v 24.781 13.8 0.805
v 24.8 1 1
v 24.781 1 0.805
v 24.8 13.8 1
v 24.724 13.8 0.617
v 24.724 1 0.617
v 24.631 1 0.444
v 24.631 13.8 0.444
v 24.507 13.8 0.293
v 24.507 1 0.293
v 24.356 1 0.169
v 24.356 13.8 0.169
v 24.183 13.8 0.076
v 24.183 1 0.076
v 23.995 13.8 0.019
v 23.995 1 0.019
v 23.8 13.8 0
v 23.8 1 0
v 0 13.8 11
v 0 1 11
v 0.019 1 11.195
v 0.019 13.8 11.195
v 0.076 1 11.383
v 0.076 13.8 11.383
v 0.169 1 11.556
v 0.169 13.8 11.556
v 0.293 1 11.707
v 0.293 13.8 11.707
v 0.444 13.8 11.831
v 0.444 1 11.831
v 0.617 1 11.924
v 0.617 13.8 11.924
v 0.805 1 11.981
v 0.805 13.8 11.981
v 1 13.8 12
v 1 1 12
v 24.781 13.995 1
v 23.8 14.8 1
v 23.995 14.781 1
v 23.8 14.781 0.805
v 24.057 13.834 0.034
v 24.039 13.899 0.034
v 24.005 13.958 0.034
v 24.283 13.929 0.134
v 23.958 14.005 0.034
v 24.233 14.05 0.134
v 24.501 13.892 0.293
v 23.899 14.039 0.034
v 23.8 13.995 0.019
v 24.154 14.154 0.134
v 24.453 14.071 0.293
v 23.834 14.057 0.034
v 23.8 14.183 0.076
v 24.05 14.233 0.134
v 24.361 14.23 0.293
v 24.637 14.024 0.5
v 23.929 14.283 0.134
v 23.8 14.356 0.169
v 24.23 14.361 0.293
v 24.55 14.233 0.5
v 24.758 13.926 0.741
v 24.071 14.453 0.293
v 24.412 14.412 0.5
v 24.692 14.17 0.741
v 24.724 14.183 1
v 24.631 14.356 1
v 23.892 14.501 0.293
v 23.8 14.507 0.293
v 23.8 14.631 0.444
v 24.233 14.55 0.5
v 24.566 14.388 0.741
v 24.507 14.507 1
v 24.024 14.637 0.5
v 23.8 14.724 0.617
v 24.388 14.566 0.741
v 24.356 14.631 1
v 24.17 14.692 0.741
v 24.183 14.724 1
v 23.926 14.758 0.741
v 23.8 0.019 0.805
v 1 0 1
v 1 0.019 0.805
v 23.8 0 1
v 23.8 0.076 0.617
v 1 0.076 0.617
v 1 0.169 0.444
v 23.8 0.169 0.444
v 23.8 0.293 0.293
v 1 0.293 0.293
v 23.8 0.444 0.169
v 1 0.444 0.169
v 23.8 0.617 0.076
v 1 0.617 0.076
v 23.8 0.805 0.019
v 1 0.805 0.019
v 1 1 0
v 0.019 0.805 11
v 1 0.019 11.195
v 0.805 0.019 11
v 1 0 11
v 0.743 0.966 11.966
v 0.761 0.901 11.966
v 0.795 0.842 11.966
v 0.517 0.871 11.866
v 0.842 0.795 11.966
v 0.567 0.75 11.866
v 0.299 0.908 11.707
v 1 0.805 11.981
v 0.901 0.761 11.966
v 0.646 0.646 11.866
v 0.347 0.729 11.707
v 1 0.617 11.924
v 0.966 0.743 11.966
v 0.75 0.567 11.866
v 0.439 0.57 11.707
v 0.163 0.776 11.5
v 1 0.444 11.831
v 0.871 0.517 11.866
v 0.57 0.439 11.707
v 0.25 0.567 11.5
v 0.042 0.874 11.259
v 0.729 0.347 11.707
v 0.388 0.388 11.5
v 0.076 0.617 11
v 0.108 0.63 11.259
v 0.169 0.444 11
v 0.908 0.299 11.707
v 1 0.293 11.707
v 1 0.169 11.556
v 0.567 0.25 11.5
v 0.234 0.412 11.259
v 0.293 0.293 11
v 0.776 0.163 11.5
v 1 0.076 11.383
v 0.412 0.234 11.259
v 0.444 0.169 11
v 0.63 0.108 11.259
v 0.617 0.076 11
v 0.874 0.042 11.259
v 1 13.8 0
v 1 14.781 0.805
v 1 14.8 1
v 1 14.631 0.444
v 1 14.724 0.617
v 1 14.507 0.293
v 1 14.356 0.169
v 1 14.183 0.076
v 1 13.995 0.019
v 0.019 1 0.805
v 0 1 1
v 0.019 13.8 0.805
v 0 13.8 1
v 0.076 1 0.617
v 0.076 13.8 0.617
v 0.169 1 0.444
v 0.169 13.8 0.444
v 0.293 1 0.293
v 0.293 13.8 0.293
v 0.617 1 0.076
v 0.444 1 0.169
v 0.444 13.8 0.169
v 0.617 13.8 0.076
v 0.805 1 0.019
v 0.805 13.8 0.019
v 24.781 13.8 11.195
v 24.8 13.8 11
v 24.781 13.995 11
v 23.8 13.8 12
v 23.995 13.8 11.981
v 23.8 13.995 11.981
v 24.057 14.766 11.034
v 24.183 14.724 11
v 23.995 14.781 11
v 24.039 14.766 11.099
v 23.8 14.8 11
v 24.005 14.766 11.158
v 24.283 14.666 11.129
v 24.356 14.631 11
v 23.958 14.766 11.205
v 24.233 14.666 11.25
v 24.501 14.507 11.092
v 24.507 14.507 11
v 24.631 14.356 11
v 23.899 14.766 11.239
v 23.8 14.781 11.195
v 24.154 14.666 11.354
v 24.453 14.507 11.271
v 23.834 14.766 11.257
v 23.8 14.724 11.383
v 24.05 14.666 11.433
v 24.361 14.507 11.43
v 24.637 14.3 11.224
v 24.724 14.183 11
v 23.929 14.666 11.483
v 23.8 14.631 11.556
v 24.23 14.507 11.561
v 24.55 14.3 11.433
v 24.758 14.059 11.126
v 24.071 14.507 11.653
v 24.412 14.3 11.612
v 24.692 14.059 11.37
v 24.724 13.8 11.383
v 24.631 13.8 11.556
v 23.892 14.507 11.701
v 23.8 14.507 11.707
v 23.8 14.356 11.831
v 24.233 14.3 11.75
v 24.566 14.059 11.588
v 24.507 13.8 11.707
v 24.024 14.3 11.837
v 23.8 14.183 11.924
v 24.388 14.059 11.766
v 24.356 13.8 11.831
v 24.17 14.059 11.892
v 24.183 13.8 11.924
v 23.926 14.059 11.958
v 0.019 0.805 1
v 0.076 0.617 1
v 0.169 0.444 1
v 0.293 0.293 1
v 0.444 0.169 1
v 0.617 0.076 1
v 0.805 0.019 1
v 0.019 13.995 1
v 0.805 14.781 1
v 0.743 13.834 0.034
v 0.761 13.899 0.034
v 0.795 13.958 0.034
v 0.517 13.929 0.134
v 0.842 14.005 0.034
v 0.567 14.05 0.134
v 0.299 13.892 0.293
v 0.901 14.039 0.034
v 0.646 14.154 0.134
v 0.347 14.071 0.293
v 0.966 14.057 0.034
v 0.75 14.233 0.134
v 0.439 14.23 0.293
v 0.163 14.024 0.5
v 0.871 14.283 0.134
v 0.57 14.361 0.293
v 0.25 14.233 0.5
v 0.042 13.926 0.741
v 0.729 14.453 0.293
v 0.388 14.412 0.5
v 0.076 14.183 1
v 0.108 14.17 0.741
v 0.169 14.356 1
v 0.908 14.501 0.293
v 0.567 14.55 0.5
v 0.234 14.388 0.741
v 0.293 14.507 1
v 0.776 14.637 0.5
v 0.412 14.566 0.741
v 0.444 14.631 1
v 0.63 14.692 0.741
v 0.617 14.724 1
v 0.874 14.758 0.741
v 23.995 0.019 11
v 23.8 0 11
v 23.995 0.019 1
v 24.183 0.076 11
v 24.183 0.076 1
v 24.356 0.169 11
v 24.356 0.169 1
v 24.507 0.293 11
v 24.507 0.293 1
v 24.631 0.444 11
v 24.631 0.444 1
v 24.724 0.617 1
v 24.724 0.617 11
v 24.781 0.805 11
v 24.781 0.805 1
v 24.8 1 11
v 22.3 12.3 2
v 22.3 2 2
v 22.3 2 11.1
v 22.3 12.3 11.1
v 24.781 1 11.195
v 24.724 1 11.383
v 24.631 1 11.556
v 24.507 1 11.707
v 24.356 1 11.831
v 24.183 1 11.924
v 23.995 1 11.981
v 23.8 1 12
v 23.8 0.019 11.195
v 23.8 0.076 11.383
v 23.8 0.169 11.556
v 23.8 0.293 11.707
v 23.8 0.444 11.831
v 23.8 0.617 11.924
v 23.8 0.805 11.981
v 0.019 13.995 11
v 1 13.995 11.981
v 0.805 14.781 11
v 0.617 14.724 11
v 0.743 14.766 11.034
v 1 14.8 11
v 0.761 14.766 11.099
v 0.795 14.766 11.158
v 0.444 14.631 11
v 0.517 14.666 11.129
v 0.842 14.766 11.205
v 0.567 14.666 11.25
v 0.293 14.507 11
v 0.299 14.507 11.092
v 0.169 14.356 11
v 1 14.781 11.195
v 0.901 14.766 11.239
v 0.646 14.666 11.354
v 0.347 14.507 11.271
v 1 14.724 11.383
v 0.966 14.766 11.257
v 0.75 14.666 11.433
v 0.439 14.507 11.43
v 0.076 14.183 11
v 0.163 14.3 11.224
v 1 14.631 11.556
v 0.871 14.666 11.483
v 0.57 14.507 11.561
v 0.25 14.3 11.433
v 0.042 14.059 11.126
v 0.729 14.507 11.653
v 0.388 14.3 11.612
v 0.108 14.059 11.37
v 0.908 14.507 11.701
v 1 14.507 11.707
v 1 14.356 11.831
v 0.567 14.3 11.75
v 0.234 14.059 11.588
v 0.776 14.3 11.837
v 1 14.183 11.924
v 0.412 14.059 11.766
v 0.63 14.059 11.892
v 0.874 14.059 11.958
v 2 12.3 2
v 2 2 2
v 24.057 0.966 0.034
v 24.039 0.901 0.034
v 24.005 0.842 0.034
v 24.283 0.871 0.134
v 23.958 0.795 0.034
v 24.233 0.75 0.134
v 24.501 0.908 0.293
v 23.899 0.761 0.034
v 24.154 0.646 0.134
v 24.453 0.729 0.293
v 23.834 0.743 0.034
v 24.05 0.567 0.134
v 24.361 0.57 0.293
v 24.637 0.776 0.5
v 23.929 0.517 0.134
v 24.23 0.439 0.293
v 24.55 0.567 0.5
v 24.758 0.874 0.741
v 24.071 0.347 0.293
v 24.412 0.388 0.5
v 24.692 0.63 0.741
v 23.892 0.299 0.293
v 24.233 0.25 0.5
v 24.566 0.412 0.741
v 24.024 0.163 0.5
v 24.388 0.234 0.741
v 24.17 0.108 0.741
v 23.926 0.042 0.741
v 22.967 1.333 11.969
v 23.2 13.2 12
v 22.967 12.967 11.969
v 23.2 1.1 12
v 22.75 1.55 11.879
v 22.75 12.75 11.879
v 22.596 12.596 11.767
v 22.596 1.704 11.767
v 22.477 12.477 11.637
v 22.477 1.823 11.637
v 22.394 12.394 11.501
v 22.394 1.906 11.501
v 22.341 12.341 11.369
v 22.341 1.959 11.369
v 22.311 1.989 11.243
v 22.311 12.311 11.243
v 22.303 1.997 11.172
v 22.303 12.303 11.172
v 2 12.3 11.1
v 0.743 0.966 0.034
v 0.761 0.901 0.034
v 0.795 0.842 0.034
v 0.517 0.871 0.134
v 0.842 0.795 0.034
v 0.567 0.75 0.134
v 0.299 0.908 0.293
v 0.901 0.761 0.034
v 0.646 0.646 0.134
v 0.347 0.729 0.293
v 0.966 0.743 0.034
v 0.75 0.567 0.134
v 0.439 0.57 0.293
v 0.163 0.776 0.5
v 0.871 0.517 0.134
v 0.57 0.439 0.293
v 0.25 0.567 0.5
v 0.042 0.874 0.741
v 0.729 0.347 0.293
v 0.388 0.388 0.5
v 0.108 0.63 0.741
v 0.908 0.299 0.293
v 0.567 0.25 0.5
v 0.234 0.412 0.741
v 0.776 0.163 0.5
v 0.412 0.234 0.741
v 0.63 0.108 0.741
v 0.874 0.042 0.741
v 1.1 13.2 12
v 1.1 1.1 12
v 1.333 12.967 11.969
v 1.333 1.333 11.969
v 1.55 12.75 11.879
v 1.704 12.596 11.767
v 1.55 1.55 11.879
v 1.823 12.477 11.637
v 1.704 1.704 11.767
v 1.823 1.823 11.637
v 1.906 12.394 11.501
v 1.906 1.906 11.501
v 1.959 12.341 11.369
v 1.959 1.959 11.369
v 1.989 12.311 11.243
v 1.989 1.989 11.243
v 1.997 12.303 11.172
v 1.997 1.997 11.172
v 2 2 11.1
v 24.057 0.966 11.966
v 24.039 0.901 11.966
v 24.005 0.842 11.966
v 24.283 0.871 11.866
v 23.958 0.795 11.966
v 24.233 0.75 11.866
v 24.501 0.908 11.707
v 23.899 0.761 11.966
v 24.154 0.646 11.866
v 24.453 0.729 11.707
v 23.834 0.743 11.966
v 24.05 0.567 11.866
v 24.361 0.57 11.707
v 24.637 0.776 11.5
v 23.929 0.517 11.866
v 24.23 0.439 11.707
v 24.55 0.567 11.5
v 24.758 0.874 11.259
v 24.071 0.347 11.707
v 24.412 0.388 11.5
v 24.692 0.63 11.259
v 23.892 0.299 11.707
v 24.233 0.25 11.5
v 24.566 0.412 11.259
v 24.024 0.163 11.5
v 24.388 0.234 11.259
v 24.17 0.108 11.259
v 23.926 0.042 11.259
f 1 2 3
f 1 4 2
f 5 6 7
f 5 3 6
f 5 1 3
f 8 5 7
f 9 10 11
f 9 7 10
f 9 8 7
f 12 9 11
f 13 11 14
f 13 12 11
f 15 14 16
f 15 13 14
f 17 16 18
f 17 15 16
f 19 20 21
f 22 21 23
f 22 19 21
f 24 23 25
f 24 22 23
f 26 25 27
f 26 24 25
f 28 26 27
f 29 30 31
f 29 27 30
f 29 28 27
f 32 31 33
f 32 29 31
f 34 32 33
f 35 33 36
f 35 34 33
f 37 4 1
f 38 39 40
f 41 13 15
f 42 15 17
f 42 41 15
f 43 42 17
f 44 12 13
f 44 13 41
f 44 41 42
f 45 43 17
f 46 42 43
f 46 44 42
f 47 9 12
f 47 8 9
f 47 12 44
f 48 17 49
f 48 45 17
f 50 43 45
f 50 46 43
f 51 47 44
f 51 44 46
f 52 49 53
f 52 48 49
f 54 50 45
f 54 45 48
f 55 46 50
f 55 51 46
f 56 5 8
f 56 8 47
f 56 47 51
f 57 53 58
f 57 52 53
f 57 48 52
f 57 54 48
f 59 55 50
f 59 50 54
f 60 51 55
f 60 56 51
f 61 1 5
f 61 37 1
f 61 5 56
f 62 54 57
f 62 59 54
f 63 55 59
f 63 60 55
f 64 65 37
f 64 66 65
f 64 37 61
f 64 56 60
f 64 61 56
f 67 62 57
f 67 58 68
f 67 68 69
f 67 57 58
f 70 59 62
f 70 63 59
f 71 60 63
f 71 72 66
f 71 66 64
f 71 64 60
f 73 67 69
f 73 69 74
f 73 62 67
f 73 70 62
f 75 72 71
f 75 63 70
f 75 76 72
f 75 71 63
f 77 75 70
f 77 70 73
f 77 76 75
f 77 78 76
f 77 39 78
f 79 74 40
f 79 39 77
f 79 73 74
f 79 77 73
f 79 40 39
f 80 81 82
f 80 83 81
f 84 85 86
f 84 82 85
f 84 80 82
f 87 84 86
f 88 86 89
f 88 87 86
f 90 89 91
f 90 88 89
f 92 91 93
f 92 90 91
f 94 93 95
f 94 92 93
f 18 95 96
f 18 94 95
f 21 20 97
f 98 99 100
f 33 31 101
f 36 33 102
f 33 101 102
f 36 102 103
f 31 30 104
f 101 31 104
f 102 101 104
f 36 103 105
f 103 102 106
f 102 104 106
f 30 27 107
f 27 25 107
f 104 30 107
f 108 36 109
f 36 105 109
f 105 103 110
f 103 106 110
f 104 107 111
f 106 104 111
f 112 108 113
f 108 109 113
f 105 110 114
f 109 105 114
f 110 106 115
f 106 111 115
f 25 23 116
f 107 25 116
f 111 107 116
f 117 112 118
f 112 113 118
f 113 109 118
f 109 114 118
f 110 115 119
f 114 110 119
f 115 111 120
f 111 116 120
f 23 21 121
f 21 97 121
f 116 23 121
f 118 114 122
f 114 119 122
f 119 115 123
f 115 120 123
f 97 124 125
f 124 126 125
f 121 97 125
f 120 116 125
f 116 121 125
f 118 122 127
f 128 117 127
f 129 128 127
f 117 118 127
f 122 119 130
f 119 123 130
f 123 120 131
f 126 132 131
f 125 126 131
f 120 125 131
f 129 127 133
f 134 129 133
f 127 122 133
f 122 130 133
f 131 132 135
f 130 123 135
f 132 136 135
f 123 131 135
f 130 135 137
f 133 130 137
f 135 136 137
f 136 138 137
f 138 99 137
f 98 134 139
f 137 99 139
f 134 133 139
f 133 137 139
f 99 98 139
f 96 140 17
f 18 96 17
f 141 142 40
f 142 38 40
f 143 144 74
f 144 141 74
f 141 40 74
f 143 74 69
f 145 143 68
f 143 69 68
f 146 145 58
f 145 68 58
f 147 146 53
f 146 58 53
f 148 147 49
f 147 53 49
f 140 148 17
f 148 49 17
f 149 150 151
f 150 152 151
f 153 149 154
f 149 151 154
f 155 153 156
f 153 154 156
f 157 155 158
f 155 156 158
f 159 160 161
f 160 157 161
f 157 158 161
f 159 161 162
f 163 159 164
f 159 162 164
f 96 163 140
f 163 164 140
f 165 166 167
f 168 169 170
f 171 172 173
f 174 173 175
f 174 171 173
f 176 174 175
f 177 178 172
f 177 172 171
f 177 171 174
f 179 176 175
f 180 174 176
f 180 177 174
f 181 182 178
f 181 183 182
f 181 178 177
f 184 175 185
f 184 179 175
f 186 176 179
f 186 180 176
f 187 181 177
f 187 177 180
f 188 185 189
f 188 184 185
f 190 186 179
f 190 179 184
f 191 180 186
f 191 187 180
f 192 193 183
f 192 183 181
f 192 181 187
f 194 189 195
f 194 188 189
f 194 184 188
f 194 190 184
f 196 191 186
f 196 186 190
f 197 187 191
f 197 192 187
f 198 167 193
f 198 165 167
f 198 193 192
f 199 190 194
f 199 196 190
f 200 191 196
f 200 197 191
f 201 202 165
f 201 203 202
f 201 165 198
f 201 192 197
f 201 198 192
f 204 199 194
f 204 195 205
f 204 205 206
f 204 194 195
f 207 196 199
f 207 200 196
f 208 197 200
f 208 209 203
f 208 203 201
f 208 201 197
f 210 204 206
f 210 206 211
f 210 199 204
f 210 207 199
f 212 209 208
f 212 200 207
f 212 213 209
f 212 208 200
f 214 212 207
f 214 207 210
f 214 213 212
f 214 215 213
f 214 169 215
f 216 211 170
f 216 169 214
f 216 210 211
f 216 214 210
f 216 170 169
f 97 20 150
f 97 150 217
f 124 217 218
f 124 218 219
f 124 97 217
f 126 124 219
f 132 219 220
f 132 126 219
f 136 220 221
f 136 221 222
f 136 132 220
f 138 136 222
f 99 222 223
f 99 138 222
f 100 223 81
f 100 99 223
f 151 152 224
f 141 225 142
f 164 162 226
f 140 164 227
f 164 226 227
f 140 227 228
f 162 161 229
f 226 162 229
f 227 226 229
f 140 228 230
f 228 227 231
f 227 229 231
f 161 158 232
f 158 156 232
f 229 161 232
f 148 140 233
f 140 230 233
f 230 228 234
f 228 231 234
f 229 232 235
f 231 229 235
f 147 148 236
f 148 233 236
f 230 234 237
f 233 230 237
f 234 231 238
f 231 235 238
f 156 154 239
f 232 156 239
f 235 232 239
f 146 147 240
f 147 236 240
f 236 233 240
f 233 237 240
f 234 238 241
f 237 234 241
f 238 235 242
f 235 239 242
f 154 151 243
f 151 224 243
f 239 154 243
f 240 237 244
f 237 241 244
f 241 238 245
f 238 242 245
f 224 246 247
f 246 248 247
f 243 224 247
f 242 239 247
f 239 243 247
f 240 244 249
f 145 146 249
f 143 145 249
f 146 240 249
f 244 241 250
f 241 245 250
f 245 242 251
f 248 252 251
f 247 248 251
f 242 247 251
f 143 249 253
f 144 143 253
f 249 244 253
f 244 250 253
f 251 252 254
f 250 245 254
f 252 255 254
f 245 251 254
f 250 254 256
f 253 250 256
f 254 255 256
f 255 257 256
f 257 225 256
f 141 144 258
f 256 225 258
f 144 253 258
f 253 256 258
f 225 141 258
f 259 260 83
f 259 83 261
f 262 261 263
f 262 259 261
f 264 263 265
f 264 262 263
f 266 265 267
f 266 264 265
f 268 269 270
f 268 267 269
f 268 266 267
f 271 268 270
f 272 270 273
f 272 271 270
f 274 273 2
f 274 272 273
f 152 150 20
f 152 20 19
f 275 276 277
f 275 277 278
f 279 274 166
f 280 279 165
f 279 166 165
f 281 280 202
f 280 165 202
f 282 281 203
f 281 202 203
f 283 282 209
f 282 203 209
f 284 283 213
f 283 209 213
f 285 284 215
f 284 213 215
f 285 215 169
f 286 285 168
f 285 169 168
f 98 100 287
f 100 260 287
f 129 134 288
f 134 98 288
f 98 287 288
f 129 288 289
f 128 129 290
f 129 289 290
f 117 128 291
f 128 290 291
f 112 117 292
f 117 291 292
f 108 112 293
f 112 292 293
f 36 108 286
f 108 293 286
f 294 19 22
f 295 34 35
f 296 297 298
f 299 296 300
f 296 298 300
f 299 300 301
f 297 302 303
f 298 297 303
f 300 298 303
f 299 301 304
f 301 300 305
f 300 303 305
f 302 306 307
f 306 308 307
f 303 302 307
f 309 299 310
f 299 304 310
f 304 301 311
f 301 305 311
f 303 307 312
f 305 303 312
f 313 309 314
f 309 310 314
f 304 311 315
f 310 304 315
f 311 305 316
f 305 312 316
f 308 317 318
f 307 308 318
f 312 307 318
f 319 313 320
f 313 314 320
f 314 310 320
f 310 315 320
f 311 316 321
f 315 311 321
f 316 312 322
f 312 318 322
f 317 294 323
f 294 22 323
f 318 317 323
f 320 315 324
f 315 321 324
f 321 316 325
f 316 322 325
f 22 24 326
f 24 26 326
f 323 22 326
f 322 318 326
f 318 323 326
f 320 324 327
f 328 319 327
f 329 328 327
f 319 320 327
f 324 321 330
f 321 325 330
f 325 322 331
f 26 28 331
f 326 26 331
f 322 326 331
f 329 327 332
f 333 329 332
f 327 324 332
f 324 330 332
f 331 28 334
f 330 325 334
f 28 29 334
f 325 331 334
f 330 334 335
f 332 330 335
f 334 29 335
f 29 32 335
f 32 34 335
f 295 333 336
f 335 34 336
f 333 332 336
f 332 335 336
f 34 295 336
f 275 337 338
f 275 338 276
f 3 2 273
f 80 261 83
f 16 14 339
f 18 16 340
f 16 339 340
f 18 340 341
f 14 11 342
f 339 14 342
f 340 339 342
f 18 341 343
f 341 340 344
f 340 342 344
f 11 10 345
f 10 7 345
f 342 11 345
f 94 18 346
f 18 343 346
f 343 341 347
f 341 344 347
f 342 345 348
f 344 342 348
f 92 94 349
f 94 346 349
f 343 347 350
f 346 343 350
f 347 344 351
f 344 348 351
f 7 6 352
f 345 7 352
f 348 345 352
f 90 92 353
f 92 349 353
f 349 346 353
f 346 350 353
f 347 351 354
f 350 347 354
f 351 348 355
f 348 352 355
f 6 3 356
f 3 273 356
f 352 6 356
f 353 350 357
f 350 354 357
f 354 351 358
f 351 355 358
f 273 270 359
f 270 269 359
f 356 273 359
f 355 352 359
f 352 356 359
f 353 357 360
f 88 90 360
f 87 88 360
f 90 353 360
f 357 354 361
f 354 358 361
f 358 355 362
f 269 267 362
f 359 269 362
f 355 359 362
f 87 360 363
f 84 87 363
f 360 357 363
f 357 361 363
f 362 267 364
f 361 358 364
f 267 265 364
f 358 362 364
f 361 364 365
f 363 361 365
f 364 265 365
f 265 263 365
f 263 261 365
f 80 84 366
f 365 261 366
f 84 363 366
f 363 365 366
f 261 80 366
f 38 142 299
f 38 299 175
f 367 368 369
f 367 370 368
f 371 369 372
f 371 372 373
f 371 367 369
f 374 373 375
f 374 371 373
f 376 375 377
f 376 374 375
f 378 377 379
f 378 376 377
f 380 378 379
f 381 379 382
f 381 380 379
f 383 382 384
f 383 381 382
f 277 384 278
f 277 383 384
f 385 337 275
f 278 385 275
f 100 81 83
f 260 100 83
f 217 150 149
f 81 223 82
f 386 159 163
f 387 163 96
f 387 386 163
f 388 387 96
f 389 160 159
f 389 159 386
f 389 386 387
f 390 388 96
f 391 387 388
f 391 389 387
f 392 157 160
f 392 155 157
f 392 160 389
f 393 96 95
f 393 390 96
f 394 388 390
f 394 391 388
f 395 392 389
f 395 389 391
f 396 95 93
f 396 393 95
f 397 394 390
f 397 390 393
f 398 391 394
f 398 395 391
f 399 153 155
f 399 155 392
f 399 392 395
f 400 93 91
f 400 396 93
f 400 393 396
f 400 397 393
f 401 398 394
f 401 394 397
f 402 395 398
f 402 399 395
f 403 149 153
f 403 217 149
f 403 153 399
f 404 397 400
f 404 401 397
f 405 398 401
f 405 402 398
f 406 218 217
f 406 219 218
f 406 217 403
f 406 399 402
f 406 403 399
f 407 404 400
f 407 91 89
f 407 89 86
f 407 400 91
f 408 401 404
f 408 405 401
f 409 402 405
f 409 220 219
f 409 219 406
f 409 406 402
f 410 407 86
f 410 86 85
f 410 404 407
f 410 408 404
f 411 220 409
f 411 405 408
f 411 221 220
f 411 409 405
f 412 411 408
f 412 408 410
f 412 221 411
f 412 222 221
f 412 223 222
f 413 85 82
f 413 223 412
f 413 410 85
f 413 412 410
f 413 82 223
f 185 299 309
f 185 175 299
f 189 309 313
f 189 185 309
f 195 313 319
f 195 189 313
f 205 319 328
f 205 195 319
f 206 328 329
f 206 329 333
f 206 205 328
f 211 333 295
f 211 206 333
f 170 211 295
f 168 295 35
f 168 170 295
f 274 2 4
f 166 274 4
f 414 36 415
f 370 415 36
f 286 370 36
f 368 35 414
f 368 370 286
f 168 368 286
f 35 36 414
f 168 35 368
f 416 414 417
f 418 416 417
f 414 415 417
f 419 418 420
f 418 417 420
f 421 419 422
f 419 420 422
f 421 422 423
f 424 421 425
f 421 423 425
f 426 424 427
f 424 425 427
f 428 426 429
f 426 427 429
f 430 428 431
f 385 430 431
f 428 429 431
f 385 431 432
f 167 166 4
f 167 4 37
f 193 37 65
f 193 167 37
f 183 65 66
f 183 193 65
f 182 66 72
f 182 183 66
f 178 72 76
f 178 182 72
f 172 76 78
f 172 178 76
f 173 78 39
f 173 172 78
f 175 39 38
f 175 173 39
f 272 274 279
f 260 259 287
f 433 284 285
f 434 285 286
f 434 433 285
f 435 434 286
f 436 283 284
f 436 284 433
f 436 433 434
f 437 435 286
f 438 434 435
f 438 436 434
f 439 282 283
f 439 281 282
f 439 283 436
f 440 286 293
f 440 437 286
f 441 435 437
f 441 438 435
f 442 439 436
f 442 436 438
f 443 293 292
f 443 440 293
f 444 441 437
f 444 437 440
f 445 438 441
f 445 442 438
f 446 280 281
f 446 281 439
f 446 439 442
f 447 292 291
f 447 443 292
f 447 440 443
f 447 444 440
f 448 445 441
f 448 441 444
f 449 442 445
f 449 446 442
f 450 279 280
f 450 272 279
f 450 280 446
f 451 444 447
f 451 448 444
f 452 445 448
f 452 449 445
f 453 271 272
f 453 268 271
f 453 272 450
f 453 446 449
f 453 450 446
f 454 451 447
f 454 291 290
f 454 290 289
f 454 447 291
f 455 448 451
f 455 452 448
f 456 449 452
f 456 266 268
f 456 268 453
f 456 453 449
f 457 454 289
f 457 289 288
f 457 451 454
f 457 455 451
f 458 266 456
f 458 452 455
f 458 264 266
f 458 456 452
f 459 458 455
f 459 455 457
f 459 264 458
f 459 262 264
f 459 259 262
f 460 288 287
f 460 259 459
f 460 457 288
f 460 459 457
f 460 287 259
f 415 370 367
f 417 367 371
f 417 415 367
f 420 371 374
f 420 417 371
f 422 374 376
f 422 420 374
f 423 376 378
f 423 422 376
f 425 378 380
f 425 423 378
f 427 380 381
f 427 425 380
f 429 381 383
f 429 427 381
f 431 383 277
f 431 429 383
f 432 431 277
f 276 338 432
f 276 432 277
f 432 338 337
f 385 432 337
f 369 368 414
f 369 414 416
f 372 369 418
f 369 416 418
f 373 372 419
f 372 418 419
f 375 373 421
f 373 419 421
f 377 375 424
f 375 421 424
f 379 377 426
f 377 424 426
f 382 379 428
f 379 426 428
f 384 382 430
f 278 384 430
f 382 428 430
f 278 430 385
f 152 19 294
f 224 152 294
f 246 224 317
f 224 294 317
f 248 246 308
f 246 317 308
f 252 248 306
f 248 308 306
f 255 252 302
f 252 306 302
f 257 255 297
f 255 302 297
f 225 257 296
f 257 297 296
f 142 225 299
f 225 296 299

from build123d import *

# Parameters (mm, degrees)
BOX038_W     = 20.3
BOX038_H     = 10.3
BOX038_DEPTH = 300
BOX039_W     = 24.8
BOX039_H     = 14.8
BOX039_DEPTH = 12
FILLET019_R  = 1
FILLET020_R  = 0.9


with BuildPart() as cube_20x10_clone001:
    # Box038 → Box038 (new body)
    with BuildSketch(Plane.XY):
        with Locations((10.15, 5.15)):
            Rectangle(BOX038_W, BOX038_H)
    extrude(amount=BOX038_DEPTH)


with BuildPart() as cube_20x10_clone001_1:
    # Body012 placement: moved
    add(cube_20x10_clone001.part.moved(Location((2, 2, 2))))


with BuildPart() as profile_cap_outer_fillet:
    # Box039 → Box039 (new body)
    with BuildSketch(Plane.XY):
        with Locations((12.4, 7.4)):
            Rectangle(BOX039_W, BOX039_H)
    extrude(amount=BOX039_DEPTH)

    # Fillet019
    fillet019_edges = [profile_cap_outer_fillet.edges().sort_by_distance(p)[0] for p in [
        (0, 0, 6),
        (0, 7.4, 12),
        (0, 14.8, 6),
        (0, 7.4, 0),
        (24.8, 0, 6),
        (24.8, 7.4, 12),
        (24.8, 14.8, 6),
        (24.8, 7.4, 0),
        (12.4, 0, 0),
        (12.4, 0, 12),
        (12.4, 14.8, 0),
        (12.4, 14.8, 12),
    ]]
    fillet(fillet019_edges, radius=FILLET019_R)

    # Cut023012: cut cube 20x10 clone001
    add(cube_20x10_clone001_1.part, mode=Mode.SUBTRACT)

    # Fillet020
    fillet020_edges = [profile_cap_outer_fillet.edges().sort_by_distance(p)[0] for p in [
        (12.15, 2, 12),
        (22.3, 7.15, 12),
        (12.15, 12.3, 12),
        (2, 7.15, 12),
    ]]
    fillet(fillet020_edges, radius=FILLET020_R)


solid = profile_cap_outer_fillet.part
